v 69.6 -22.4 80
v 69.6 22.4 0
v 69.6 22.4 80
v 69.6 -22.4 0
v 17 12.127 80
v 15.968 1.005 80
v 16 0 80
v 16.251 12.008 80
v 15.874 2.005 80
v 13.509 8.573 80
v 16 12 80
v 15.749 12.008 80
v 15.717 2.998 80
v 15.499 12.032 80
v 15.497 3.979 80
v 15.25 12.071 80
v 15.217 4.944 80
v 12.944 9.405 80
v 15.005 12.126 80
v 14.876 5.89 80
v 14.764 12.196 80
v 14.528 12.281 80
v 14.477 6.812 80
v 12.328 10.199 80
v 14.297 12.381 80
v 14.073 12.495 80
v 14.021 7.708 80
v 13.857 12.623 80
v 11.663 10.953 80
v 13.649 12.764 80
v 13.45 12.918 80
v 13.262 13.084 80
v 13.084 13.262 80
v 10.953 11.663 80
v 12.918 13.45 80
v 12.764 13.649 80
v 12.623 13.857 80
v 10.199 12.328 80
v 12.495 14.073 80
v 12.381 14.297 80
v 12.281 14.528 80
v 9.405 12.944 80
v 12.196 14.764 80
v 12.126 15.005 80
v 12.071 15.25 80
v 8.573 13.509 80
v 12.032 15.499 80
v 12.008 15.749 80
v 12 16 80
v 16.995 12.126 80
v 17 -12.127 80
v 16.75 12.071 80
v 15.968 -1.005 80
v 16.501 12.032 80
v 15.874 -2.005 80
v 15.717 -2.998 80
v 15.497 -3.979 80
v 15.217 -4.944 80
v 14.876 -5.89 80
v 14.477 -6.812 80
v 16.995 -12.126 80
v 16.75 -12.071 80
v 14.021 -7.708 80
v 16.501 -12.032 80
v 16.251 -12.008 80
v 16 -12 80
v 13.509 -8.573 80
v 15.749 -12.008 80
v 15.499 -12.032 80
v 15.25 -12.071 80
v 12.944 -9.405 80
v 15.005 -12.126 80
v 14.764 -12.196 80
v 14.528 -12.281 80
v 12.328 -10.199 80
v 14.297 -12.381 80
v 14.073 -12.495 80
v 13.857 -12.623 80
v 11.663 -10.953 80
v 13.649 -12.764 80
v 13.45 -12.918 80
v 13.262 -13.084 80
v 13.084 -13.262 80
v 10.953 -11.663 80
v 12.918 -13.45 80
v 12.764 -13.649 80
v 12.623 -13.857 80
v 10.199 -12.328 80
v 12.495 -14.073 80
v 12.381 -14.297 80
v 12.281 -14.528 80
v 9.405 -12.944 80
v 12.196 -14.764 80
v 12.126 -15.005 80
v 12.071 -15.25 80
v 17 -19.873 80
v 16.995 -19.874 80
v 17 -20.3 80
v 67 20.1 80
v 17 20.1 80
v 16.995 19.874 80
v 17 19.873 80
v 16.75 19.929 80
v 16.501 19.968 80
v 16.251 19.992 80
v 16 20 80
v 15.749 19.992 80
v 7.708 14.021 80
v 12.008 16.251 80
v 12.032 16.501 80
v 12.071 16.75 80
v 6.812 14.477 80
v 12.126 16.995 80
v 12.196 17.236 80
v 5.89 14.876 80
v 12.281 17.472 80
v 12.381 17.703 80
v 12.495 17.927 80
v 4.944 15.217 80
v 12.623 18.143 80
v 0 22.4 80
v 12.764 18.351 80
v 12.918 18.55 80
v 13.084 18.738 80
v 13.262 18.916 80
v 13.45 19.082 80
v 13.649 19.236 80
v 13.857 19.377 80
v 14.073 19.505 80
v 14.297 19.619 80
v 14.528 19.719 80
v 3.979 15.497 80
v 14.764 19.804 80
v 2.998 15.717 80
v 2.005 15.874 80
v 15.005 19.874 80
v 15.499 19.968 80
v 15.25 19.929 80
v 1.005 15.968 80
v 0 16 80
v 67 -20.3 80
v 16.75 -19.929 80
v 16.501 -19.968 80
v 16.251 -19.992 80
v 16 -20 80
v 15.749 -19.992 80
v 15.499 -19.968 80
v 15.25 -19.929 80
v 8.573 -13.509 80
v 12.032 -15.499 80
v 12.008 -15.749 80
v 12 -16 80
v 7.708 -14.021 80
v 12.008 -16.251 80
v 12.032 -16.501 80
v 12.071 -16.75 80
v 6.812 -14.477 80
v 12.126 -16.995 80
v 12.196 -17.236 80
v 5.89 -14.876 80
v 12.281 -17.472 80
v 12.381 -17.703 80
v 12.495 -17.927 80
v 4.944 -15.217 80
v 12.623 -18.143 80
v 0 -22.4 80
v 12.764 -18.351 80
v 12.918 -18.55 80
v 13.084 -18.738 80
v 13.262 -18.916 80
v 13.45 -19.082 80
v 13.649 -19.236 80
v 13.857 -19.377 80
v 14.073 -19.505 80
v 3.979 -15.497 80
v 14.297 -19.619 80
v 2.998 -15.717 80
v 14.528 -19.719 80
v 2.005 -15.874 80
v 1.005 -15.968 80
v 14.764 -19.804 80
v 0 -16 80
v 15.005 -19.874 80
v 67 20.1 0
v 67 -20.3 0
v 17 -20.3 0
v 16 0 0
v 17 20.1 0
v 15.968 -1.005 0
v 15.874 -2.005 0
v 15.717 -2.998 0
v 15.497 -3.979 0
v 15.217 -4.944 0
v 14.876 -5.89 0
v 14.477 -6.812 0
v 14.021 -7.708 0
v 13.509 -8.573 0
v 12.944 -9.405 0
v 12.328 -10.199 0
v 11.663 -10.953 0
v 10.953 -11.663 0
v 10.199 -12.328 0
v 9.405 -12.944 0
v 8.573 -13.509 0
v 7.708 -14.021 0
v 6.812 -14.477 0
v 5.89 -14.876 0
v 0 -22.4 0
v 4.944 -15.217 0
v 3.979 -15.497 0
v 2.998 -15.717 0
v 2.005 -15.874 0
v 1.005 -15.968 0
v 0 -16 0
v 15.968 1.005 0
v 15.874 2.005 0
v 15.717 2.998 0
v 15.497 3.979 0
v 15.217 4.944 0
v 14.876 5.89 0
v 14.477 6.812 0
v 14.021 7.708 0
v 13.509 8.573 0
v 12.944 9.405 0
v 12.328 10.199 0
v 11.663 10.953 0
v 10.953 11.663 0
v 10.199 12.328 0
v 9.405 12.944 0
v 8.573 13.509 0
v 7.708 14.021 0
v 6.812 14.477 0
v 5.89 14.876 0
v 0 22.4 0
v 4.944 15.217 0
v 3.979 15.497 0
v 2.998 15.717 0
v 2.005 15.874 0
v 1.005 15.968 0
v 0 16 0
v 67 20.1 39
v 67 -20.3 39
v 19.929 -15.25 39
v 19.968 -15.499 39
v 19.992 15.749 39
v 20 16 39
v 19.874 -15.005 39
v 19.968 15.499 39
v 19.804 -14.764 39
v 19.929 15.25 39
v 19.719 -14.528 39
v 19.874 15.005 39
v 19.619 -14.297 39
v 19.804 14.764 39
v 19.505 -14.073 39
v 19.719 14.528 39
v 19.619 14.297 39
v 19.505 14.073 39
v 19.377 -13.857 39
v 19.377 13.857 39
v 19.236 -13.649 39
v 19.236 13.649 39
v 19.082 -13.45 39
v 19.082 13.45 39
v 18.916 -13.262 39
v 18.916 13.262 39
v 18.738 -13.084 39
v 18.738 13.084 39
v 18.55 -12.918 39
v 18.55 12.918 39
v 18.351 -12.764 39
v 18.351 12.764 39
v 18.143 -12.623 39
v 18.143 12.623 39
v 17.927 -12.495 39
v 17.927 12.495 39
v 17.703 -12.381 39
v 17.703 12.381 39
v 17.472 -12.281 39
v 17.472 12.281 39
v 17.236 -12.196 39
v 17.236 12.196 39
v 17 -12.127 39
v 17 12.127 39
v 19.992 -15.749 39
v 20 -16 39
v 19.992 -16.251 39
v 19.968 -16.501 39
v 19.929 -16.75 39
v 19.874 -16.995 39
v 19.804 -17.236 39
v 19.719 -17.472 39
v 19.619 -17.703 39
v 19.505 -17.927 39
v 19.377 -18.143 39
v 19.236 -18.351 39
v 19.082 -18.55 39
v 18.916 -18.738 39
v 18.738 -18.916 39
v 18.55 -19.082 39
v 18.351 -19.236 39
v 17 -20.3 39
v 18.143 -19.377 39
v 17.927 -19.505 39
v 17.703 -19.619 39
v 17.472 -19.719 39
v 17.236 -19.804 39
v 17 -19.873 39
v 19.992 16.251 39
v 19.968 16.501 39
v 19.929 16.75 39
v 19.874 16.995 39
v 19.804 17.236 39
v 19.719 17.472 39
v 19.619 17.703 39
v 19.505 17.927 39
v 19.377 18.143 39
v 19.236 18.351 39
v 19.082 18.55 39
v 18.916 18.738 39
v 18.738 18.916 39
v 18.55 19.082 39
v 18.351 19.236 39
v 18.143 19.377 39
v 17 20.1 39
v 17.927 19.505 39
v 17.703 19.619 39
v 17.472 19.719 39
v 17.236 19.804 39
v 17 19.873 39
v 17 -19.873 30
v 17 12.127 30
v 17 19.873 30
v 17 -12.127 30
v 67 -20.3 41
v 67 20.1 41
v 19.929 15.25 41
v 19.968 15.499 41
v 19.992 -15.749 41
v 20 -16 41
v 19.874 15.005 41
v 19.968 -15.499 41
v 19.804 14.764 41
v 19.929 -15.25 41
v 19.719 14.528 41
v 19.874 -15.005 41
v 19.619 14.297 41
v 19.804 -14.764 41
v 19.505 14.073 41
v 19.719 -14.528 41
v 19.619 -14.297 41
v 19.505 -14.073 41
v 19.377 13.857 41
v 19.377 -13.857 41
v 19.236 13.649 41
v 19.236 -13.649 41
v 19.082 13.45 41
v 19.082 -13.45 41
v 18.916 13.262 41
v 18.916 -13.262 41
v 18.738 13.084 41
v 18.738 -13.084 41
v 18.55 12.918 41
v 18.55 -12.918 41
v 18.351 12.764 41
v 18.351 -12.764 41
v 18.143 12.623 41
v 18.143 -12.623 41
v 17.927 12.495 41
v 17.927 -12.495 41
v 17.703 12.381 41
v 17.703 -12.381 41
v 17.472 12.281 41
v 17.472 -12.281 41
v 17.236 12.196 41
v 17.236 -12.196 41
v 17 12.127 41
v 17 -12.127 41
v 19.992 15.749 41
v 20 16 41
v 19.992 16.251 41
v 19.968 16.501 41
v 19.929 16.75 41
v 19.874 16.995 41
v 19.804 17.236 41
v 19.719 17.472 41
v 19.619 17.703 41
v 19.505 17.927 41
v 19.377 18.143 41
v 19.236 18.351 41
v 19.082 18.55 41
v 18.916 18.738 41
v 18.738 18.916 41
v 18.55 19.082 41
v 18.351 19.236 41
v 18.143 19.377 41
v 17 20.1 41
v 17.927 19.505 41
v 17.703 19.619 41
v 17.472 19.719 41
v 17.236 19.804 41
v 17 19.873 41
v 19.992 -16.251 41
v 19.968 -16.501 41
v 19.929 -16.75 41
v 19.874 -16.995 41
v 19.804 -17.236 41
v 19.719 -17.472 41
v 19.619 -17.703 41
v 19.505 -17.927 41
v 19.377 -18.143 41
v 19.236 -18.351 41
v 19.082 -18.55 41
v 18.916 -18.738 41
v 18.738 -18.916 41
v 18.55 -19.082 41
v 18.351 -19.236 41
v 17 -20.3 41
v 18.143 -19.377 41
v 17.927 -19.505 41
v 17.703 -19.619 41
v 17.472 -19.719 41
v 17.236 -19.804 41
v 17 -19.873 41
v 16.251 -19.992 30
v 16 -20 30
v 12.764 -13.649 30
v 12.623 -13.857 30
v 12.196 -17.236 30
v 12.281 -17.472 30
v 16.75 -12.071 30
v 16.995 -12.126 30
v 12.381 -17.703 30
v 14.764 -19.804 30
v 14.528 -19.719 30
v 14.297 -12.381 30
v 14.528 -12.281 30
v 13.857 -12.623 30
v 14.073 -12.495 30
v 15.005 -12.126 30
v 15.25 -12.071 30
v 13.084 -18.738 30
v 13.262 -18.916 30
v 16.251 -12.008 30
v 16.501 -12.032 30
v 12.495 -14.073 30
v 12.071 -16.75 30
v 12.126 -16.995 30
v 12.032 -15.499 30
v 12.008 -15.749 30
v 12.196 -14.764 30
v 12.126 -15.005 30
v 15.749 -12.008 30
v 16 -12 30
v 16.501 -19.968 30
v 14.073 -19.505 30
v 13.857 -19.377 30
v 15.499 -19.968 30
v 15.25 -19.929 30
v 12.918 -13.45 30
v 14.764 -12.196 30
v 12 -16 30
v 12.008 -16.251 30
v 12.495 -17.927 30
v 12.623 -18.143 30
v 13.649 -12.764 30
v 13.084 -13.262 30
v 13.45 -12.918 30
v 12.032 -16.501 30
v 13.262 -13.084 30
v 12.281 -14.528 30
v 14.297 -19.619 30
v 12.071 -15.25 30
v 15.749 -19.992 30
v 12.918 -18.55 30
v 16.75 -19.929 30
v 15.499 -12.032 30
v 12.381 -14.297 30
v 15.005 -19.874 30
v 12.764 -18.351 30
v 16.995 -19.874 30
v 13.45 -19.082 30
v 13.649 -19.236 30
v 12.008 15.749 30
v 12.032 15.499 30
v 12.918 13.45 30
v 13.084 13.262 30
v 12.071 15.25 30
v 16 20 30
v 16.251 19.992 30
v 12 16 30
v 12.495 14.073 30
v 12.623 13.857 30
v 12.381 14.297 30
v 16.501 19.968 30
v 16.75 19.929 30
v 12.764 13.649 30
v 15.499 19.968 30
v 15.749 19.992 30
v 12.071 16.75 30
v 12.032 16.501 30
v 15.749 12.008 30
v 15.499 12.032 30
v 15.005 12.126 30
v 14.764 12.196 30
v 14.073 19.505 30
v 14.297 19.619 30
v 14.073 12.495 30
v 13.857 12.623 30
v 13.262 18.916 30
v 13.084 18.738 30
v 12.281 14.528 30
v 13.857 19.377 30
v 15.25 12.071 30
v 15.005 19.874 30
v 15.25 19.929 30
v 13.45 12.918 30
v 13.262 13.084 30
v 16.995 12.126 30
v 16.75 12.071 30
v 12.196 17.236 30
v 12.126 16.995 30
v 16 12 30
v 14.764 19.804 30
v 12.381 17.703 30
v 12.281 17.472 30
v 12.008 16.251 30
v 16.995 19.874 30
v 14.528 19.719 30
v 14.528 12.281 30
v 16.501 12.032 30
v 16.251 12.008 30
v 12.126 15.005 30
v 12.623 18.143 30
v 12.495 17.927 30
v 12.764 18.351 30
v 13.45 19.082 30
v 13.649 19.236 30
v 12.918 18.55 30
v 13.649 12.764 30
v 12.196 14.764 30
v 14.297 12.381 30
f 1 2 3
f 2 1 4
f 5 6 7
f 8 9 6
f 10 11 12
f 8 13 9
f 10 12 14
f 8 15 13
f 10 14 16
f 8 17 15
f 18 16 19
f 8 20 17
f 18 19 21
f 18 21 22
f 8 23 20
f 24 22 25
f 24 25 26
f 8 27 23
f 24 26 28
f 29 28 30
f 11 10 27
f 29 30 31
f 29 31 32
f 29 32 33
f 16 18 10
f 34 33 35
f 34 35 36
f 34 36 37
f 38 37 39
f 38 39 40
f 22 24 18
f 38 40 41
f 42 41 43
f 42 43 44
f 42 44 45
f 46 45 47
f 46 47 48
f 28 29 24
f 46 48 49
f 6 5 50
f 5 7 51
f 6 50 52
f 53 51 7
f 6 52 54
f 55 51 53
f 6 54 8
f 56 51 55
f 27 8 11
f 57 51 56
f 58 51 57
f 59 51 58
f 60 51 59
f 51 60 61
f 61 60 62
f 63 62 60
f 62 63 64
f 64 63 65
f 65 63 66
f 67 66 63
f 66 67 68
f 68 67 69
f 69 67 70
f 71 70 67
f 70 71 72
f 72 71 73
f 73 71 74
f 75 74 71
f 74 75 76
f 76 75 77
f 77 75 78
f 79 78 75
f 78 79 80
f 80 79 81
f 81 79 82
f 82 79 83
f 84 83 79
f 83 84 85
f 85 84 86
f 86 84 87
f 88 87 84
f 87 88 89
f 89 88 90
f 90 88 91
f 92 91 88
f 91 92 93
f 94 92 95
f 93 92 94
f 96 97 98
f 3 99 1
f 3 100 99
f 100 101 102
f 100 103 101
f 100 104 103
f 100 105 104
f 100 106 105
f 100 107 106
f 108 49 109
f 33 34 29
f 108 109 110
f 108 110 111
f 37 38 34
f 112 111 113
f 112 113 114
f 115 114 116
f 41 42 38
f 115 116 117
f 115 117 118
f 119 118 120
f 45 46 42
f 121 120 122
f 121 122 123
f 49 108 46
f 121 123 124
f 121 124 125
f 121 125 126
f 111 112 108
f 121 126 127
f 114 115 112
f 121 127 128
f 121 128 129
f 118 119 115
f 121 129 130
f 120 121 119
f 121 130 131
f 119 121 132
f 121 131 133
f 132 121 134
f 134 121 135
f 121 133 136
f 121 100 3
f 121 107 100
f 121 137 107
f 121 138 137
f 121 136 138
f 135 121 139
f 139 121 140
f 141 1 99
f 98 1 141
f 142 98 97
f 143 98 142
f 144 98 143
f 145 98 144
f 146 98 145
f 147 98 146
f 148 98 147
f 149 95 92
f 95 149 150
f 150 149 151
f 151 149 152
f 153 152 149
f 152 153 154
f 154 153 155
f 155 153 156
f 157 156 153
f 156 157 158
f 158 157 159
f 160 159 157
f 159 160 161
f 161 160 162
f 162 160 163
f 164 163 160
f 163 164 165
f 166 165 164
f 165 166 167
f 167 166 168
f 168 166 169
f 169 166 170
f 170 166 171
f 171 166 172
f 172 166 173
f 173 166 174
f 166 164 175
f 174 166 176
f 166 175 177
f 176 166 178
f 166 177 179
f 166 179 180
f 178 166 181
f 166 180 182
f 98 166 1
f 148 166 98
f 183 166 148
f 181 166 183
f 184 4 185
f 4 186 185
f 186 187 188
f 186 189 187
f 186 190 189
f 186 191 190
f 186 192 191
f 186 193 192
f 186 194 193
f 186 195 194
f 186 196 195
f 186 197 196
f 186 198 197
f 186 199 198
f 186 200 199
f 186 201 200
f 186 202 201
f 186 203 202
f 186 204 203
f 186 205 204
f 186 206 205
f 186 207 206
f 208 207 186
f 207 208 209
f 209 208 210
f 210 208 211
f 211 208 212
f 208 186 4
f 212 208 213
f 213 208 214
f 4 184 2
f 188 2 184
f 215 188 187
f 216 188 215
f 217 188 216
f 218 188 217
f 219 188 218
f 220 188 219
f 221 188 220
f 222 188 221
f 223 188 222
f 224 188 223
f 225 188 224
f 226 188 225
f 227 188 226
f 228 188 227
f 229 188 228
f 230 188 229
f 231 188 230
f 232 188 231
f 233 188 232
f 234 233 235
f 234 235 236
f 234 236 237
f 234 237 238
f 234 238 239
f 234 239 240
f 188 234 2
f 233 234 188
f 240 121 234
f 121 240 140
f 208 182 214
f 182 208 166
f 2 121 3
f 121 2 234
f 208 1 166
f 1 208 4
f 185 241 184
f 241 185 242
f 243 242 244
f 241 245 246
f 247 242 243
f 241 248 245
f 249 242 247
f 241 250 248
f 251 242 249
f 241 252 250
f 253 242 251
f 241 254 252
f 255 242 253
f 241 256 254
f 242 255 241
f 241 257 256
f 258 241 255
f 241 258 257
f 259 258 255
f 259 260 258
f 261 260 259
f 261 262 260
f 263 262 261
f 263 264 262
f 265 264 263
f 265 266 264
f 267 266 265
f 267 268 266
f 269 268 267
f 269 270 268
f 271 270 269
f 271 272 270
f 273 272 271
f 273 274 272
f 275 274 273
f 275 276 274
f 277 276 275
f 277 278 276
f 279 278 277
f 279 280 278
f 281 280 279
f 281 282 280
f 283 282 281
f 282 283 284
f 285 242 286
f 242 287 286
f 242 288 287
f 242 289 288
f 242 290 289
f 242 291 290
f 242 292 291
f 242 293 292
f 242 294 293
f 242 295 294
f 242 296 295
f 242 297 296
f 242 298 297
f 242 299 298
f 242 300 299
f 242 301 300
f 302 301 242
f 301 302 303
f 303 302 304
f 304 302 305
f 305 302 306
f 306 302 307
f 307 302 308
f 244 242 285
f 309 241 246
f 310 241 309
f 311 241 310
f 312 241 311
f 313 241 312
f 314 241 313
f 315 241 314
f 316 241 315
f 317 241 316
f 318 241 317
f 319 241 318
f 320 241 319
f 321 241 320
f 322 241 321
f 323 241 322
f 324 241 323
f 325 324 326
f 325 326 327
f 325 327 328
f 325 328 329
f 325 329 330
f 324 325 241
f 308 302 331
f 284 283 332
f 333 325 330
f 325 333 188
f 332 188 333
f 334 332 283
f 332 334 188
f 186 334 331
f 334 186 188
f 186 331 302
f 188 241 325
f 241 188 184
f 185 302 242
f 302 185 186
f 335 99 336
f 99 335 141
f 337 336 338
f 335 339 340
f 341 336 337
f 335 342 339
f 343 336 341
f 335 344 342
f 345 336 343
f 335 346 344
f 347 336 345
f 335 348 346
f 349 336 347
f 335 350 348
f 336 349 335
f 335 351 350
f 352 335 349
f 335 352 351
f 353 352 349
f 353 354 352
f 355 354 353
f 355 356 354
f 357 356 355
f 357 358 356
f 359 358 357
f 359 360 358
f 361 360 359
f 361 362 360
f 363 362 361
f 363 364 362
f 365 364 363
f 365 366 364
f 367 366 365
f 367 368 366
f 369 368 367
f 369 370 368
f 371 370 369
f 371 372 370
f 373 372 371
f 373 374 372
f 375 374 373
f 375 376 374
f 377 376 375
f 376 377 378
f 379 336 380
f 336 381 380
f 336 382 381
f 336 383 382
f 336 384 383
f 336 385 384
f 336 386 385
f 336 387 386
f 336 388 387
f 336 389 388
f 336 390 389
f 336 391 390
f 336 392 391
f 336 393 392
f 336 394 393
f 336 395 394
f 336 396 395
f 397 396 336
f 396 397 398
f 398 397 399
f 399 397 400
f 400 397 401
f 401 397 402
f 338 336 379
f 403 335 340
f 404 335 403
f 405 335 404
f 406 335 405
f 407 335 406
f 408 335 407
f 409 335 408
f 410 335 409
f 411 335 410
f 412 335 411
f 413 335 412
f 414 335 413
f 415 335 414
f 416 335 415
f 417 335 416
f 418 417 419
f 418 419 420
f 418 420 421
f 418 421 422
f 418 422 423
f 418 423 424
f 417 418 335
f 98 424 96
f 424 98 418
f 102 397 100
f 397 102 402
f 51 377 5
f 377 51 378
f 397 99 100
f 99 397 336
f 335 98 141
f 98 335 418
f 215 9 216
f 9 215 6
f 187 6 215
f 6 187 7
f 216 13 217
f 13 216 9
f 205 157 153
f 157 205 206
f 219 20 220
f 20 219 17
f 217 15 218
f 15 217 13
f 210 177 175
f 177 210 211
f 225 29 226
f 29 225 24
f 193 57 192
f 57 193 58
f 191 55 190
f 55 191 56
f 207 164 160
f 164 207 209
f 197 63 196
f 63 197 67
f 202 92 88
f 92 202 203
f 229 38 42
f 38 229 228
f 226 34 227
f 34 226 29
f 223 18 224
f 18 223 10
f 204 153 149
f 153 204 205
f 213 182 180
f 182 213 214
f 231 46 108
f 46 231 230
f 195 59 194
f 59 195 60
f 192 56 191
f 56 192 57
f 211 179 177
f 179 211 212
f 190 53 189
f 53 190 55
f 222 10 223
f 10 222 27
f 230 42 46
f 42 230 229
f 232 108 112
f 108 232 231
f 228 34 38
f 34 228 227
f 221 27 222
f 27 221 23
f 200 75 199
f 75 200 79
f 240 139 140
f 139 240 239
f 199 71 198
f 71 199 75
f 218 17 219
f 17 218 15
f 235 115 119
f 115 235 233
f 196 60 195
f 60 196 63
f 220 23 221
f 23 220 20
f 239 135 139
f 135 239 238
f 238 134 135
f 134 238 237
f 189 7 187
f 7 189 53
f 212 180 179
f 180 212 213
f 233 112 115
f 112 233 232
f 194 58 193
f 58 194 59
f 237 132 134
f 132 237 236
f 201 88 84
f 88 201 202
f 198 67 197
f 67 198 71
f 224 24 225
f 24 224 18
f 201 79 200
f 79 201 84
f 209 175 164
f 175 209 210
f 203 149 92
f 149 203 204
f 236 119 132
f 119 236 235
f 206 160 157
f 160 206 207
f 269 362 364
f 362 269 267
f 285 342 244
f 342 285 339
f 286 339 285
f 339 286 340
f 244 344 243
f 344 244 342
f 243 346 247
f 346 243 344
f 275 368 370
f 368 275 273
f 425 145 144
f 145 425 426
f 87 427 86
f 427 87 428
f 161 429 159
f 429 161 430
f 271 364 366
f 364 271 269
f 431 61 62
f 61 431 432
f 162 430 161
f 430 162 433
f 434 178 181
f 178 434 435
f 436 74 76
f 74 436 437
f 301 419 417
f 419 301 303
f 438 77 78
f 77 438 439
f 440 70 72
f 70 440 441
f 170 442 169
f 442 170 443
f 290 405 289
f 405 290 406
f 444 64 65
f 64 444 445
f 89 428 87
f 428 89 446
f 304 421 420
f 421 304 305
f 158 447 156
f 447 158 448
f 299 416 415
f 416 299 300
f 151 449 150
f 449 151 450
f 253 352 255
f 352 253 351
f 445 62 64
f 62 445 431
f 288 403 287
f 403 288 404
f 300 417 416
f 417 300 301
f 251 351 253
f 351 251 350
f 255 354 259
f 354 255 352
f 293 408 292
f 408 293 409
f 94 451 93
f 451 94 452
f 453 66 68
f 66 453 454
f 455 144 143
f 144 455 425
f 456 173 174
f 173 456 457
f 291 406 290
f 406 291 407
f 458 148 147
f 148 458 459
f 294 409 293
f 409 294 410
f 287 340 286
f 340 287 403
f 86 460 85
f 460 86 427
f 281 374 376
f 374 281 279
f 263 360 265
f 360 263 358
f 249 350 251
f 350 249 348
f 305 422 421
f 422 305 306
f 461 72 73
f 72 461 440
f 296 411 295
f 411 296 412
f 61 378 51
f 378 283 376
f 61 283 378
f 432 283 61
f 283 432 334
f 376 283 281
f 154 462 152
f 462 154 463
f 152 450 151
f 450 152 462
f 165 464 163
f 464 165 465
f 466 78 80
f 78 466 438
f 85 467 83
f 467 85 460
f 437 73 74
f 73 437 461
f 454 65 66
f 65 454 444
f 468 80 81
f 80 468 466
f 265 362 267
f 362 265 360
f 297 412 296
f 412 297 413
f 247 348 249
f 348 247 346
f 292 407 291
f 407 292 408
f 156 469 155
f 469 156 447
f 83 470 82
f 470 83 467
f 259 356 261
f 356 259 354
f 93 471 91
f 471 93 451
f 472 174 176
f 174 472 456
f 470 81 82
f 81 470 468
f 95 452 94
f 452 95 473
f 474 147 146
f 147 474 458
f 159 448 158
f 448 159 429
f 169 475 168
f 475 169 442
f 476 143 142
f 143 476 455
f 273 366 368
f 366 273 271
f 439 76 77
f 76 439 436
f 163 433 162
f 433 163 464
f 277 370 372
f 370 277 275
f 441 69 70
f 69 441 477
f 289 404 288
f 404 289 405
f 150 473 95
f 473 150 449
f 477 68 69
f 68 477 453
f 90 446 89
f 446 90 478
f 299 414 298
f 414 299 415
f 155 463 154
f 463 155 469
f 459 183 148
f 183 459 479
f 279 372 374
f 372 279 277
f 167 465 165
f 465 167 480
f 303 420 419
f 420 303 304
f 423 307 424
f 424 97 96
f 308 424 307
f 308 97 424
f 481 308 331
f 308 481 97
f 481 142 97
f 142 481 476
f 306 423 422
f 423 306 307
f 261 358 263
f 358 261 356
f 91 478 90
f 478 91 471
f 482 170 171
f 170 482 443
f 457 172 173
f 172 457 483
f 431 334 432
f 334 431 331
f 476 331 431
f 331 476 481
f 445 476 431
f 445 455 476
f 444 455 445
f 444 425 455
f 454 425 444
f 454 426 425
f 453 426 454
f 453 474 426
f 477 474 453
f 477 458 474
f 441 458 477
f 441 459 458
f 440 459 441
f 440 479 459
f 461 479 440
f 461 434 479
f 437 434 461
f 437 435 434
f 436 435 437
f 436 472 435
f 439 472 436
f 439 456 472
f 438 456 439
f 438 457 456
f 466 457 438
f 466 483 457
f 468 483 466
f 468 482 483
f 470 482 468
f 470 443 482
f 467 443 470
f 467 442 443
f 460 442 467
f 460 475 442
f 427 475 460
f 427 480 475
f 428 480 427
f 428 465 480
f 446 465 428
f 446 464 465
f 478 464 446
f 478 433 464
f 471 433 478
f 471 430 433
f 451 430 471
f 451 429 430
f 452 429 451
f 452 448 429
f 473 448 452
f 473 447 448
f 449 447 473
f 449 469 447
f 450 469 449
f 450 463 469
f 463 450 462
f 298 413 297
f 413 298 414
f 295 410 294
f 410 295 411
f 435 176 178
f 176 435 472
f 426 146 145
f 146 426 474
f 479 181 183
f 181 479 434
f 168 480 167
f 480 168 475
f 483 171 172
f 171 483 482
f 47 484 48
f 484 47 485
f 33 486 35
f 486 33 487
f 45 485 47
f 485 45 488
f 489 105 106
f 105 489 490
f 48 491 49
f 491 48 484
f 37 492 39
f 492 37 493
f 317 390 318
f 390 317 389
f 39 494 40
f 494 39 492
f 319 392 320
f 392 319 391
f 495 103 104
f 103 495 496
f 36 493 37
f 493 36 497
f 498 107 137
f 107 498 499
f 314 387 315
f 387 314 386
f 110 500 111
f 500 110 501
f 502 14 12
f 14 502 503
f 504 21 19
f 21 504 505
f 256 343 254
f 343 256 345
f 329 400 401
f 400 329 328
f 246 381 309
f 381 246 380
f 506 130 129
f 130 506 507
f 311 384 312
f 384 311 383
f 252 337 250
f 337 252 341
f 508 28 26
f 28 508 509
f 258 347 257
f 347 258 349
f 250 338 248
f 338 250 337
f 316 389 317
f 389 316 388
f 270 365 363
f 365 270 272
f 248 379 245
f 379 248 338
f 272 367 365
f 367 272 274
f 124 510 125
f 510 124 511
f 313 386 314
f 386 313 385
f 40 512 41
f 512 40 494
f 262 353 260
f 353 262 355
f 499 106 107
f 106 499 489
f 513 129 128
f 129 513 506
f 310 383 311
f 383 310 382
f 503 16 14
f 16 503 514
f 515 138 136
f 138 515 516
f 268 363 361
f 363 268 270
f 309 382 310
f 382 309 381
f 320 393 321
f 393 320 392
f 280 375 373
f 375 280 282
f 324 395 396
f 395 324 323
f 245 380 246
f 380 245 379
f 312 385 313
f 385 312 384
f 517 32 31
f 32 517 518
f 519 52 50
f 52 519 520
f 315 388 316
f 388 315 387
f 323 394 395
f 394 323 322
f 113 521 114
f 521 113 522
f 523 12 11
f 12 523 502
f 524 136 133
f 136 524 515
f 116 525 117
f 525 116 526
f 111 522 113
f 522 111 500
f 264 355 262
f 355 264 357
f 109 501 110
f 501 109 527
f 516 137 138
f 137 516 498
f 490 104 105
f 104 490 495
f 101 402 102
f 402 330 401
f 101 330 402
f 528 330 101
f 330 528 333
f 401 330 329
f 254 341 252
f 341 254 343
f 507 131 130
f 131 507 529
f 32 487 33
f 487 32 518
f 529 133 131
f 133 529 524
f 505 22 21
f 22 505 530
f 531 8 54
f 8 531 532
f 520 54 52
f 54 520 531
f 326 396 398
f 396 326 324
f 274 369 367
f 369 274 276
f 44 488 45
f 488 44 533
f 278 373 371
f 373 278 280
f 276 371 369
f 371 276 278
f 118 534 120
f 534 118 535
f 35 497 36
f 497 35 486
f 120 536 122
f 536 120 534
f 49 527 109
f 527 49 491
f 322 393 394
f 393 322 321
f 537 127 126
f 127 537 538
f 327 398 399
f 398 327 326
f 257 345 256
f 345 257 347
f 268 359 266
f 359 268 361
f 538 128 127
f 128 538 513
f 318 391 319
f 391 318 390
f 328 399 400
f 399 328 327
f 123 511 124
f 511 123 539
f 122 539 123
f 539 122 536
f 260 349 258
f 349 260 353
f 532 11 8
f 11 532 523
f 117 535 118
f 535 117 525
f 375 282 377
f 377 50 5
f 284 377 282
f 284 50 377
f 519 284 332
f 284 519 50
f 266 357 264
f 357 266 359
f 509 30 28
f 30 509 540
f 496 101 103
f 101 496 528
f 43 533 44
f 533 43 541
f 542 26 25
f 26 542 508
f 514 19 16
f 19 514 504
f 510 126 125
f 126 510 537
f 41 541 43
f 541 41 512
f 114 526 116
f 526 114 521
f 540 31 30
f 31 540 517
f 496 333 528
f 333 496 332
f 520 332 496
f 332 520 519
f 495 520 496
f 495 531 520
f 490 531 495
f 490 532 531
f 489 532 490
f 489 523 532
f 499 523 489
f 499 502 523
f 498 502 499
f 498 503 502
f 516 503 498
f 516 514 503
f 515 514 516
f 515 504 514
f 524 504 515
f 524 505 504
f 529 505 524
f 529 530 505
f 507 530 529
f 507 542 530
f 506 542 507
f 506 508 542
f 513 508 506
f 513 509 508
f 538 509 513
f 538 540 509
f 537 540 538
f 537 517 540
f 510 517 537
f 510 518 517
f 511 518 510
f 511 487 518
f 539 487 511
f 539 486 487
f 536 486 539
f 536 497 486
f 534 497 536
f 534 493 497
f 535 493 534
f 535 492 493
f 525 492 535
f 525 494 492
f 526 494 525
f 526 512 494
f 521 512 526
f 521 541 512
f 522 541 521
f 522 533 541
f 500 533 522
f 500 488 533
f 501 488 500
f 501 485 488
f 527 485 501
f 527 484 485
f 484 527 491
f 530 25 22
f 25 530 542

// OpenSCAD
// frame radius
fr = 16;

// battery width and depth and heig
batx = 51;
baty = 43;
batz = 30;

// wire radius
wr = 4;

difference() {
translate([0,-22.4,0])
cube([69.6,44.8,80]);

// bottom battery
translate([17,-20.3,-1])
cube([50,40.4,40]);

// top battery
translate([17,-20.3,41])
cube([50,40.4,40]);

// frame
translate([0,0,-1])
cylinder($fn=100,82,fr,fr);

// wire1
translate([16,-16,30])
cylinder($fn=100,51,wr,wr);

// wire2
translate([16,16,30])
cylinder($fn=100,51,wr,wr);
}
